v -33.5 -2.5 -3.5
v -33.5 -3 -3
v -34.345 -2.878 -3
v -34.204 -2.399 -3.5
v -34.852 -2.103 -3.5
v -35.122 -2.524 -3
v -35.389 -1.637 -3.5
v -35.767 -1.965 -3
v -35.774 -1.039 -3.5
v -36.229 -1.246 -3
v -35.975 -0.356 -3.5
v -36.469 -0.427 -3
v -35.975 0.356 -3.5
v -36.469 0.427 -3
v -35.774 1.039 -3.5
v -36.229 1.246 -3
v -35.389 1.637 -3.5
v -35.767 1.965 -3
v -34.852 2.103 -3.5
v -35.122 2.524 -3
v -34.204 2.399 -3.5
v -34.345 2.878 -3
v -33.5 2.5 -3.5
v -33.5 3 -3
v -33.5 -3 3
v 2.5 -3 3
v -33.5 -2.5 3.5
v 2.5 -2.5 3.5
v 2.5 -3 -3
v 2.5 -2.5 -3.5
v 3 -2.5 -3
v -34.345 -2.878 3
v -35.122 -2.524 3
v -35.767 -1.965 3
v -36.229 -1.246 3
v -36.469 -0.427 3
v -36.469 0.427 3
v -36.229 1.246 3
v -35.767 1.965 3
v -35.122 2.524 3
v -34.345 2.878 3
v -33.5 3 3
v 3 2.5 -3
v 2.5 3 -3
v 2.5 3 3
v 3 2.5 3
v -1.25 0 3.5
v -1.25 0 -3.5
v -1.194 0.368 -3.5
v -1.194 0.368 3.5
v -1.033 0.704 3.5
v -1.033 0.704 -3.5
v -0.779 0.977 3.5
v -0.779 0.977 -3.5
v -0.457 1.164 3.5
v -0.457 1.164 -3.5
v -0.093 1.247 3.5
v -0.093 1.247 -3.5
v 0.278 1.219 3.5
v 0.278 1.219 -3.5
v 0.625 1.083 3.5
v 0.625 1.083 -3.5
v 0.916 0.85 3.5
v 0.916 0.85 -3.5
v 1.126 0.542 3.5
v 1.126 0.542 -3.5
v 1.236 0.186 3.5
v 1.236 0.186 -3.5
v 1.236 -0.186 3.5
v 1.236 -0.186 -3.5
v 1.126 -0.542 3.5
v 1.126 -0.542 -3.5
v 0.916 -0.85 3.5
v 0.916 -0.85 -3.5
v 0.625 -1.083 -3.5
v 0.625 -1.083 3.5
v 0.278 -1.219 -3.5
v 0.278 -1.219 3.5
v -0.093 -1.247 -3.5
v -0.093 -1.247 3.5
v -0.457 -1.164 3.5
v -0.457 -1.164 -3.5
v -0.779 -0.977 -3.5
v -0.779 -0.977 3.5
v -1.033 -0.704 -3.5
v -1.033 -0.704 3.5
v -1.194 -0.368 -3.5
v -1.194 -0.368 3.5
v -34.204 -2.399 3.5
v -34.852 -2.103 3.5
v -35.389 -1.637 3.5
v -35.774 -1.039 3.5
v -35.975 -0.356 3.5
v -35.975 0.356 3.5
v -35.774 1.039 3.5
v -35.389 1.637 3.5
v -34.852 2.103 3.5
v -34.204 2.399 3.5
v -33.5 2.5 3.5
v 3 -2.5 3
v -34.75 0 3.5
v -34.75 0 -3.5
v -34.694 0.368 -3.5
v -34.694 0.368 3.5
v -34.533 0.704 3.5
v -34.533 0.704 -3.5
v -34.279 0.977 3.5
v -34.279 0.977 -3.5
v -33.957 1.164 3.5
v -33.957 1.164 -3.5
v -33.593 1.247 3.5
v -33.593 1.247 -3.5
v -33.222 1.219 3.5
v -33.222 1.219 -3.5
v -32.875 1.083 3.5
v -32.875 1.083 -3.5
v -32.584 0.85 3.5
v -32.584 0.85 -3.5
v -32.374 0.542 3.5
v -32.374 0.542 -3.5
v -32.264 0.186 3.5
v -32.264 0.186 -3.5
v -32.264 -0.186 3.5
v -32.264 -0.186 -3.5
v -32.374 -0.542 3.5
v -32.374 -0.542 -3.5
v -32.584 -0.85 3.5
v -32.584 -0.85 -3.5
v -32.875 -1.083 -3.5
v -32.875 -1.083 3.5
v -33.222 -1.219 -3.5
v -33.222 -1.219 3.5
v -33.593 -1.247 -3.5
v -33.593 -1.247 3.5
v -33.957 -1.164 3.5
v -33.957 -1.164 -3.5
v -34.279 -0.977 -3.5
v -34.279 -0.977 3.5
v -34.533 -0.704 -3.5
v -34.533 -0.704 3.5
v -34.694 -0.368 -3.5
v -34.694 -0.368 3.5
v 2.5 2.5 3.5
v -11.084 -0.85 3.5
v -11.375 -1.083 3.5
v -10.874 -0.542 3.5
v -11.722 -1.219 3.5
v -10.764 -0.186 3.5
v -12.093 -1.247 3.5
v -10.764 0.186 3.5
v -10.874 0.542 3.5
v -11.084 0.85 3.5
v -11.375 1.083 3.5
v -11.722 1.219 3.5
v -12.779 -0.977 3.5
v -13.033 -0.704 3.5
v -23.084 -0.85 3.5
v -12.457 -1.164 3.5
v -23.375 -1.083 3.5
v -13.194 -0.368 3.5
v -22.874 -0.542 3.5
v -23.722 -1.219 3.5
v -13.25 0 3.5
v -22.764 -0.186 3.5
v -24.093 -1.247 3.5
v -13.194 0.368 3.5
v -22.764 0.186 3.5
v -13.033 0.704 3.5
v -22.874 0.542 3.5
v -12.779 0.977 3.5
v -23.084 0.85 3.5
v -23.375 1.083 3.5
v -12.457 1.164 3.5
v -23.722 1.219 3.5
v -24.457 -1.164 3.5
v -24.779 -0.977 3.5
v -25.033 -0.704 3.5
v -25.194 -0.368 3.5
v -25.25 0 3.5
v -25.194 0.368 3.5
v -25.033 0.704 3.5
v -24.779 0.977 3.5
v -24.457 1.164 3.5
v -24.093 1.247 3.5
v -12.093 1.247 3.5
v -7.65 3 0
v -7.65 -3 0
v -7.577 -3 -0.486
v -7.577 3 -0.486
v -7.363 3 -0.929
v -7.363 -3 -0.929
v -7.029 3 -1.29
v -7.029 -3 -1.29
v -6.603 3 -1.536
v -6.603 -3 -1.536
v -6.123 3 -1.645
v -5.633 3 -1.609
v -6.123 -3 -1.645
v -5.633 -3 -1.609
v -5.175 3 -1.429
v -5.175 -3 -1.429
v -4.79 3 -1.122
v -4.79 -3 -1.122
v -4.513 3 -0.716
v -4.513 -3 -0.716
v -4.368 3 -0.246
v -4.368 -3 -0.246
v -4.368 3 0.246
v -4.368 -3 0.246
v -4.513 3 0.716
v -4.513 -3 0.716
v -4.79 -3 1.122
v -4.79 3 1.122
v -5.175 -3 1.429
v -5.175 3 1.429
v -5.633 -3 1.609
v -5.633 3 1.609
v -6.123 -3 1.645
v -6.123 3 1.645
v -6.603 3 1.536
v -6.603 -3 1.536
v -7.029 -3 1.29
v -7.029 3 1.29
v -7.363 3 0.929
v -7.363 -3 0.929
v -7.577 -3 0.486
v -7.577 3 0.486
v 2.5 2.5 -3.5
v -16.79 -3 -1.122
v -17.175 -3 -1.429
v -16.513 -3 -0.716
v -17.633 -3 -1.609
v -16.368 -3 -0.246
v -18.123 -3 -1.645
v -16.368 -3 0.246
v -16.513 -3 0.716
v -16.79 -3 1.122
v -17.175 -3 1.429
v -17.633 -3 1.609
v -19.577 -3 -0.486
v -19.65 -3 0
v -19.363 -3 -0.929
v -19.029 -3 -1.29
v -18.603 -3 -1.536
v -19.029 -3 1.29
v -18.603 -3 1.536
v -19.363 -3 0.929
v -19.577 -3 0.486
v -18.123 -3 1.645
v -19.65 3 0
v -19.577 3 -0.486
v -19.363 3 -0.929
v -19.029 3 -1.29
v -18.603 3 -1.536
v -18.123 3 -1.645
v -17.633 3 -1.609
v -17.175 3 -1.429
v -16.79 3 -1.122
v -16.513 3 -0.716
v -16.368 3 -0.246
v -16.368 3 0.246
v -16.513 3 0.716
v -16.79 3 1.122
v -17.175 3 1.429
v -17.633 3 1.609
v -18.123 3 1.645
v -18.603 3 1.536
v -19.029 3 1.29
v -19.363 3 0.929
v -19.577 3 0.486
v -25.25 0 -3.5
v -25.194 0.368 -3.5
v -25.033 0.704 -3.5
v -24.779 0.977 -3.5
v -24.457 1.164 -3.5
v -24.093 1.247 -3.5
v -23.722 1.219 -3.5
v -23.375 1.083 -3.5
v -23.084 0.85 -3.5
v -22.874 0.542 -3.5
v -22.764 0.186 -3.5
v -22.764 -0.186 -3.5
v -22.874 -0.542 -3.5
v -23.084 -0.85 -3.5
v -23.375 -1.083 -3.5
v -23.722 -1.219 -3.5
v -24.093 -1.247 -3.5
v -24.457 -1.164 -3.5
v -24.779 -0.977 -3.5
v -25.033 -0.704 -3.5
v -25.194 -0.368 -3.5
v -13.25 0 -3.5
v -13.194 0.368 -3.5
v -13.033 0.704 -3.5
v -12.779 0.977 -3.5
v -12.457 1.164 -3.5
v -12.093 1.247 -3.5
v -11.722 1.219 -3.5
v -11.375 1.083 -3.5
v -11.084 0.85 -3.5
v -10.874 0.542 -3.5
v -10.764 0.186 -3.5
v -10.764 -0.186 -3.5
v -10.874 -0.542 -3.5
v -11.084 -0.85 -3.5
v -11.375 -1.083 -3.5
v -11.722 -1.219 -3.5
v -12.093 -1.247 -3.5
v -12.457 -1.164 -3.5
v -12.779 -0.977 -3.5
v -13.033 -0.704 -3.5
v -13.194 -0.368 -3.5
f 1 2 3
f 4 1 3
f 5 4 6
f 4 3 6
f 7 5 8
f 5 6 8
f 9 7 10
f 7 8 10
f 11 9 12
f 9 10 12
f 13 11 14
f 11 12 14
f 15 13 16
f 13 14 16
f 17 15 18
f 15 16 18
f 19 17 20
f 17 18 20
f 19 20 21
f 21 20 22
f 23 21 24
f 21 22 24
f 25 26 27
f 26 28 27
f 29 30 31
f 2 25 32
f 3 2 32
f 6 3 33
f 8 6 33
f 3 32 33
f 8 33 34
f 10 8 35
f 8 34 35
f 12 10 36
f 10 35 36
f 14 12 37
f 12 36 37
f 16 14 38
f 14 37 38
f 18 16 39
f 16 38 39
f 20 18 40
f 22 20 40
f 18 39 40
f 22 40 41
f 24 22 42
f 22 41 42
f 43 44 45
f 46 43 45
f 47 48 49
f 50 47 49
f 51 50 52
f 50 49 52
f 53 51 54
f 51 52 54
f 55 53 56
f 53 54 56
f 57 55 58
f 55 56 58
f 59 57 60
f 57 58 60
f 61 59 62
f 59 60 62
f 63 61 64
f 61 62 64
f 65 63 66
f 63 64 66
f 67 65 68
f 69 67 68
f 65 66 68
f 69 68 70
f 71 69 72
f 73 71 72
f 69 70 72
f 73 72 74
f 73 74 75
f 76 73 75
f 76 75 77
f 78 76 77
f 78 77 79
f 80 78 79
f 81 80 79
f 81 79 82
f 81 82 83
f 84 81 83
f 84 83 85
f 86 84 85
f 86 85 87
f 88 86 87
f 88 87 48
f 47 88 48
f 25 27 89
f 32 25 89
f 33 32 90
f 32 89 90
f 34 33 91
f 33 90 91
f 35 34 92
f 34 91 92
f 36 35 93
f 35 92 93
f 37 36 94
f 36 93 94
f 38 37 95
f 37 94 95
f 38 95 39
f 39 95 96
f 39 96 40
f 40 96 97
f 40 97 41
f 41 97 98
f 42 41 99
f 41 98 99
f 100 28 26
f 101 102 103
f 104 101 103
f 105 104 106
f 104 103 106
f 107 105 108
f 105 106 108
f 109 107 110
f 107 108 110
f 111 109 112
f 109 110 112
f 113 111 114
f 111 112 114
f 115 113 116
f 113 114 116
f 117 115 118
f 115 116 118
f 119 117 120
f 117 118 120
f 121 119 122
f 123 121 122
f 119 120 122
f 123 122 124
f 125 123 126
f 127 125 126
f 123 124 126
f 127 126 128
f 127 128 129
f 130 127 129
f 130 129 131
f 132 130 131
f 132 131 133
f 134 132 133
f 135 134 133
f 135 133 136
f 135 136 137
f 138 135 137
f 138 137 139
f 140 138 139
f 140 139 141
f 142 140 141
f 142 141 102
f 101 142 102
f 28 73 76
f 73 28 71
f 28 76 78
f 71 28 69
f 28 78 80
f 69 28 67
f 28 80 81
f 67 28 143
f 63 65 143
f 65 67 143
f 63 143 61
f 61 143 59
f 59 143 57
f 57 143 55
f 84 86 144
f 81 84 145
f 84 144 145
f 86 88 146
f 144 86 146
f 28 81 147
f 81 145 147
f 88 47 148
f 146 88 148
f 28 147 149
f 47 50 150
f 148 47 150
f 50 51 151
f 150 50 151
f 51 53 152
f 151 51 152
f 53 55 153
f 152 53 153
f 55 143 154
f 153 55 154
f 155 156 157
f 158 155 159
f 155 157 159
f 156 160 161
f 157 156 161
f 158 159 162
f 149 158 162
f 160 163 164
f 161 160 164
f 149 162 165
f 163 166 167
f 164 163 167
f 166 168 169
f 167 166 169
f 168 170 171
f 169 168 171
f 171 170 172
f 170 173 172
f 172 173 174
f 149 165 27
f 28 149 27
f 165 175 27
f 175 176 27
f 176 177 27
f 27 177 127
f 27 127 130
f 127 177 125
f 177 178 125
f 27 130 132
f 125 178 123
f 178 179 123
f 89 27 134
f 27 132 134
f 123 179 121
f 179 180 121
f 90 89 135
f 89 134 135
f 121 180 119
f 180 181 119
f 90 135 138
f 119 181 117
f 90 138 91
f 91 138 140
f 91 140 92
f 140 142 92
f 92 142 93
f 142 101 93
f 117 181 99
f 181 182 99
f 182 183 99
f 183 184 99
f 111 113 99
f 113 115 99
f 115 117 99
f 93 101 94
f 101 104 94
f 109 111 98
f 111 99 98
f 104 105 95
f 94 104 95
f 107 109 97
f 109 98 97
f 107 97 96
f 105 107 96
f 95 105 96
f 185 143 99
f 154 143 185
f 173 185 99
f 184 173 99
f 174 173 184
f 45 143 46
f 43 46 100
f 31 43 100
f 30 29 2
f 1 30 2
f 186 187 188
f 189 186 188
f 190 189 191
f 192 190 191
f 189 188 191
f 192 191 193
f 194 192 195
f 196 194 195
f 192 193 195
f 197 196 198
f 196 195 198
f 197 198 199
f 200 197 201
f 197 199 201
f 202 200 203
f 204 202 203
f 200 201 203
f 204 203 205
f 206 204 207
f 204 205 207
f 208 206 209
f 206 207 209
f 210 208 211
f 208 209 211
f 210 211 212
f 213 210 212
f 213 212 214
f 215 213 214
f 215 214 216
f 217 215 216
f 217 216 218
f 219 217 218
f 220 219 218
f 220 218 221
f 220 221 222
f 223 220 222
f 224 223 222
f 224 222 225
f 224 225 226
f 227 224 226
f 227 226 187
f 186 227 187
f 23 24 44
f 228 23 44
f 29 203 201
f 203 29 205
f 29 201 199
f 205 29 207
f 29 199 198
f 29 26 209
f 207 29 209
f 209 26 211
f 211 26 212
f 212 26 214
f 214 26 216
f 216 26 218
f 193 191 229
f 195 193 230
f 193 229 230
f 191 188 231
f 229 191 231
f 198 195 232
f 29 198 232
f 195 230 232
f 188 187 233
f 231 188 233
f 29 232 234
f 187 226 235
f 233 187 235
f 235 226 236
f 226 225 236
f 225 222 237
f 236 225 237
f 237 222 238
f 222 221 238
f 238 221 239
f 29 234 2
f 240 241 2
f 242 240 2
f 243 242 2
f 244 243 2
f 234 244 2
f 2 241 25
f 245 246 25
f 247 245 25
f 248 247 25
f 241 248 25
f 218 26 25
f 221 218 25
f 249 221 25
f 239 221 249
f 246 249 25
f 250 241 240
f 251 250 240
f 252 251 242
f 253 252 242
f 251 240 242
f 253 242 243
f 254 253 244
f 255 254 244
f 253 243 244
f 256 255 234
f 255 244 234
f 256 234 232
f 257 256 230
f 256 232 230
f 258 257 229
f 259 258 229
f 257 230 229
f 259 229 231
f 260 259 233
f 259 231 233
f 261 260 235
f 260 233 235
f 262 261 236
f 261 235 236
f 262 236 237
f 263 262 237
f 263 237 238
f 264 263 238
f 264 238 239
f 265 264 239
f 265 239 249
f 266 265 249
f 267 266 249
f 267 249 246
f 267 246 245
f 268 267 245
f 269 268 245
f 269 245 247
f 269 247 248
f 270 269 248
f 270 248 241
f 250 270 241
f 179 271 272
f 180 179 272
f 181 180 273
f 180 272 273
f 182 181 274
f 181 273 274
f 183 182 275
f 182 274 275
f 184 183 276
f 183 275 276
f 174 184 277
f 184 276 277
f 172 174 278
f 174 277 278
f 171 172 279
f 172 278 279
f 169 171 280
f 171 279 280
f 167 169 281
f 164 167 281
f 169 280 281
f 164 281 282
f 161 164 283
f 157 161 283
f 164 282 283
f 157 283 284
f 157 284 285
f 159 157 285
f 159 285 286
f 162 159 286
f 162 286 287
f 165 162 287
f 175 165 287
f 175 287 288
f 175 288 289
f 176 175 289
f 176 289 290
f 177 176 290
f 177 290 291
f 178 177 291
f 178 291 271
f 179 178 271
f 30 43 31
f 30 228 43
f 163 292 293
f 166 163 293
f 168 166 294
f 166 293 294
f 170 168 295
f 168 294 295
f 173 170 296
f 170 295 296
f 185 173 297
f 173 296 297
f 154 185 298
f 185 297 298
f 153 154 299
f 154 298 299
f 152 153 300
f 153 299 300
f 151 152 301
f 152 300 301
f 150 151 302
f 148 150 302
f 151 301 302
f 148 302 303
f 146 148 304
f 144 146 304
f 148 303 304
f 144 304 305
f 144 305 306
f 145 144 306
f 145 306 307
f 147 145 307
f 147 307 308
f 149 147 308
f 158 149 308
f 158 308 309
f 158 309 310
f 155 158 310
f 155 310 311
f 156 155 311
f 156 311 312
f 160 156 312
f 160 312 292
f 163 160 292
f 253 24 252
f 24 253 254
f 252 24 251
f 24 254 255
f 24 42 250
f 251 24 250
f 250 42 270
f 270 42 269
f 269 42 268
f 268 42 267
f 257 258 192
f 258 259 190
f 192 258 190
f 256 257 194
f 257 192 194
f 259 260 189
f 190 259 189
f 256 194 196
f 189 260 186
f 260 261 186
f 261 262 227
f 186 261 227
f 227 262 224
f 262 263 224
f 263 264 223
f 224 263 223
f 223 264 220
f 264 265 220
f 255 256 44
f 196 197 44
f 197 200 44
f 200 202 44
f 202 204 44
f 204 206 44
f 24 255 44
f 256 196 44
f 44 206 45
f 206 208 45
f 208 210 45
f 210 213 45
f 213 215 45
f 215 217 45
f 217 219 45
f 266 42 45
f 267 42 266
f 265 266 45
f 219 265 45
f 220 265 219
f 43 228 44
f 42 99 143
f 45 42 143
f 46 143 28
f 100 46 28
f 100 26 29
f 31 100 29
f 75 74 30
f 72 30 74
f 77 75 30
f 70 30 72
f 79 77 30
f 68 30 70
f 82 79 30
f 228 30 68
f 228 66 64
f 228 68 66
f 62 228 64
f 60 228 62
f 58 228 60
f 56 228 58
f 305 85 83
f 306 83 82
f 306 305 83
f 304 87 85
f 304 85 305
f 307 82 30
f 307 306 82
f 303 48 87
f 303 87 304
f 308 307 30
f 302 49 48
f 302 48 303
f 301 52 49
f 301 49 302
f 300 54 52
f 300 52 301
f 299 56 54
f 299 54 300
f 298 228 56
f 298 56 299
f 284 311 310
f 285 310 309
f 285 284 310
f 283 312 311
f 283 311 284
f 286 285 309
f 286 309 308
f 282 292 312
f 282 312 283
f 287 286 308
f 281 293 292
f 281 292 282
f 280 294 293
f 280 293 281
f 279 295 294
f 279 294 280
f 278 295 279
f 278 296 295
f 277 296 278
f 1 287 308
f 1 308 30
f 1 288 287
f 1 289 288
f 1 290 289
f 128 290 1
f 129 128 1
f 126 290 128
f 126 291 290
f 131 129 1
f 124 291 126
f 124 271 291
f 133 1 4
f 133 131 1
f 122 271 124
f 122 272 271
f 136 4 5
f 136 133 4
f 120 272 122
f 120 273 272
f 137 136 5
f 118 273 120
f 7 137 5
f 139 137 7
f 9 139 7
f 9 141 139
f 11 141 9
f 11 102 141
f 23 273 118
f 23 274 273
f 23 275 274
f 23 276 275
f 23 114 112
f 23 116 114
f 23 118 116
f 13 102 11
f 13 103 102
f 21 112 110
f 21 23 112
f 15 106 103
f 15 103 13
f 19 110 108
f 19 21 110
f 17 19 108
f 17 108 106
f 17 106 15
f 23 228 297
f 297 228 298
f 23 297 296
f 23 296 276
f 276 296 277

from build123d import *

# Parameters (mm, degrees)
SKETCH_2_R         = 0.5
EXTRUDE_1_DEPTH    = 3.5
HOLE_WIZARD_M3_1_D = 2.5
HOLE_WIZARD_M4_1_D = 3.3
CHAMFER_1_SIZE     = 0.5


with BuildPart() as part:
    # 草图2 → 凸台-拉伸1 (new, symmetric)
    with BuildSketch(Plane.XY):
        with BuildLine():
            Line((3, 3), (3, -3))
            Line((3, -3), (-33.5, -3))
            ThreePointArc((-33.5, -3), (-36.5, 0), (-33.5, 3))
            Line((-33.5, 3), (3, 3))
        make_face()
        with Locations((-33.5, 0)):
            Circle(SKETCH_2_R, mode=Mode.SUBTRACT)
        with Locations((-24, 0)):
            Circle(SKETCH_2_R, mode=Mode.SUBTRACT)
        with Locations((-12, 0)):
            Circle(SKETCH_2_R, mode=Mode.SUBTRACT)
        Circle(SKETCH_2_R, mode=Mode.SUBTRACT)
    extrude(amount=EXTRUDE_1_DEPTH, both=True)

    # M3 螺纹孔1 (through all)
    with Locations(Plane.XY.offset(3.5)):
        with Locations((0, 0), (-12, 0), (-24, 0), (-33.5, 0)):
            Hole(HOLE_WIZARD_M3_1_D / 2)

    # M4 螺纹孔1 (through all)
    with Locations(Plane(origin=(0, 3, 0), x_dir=(1, 0, 0), z_dir=(0, 1, 0))):
        with Locations((-6, 0), (-18, 0)):
            Hole(HOLE_WIZARD_M4_1_D / 2)

    # 倒角1
    chamfer_1_edges = [part.edges().sort_by_distance(p)[0] for p in [
        (-15.25, -3, 3.5),
        (3, 0, 3.5),
        (-15.25, 3, 3.5),
        (3, 0, -3.5),
        (-15.25, -3, -3.5),
        (-36.5, 0, -3.5),
        (-15.25, 3, -3.5),
        (-36.5, 0, 3.5),
        (3, 3, 0),
        (3, -3, 0),
    ]]
    chamfer(chamfer_1_edges, length=CHAMFER_1_SIZE)


solid = part.part
